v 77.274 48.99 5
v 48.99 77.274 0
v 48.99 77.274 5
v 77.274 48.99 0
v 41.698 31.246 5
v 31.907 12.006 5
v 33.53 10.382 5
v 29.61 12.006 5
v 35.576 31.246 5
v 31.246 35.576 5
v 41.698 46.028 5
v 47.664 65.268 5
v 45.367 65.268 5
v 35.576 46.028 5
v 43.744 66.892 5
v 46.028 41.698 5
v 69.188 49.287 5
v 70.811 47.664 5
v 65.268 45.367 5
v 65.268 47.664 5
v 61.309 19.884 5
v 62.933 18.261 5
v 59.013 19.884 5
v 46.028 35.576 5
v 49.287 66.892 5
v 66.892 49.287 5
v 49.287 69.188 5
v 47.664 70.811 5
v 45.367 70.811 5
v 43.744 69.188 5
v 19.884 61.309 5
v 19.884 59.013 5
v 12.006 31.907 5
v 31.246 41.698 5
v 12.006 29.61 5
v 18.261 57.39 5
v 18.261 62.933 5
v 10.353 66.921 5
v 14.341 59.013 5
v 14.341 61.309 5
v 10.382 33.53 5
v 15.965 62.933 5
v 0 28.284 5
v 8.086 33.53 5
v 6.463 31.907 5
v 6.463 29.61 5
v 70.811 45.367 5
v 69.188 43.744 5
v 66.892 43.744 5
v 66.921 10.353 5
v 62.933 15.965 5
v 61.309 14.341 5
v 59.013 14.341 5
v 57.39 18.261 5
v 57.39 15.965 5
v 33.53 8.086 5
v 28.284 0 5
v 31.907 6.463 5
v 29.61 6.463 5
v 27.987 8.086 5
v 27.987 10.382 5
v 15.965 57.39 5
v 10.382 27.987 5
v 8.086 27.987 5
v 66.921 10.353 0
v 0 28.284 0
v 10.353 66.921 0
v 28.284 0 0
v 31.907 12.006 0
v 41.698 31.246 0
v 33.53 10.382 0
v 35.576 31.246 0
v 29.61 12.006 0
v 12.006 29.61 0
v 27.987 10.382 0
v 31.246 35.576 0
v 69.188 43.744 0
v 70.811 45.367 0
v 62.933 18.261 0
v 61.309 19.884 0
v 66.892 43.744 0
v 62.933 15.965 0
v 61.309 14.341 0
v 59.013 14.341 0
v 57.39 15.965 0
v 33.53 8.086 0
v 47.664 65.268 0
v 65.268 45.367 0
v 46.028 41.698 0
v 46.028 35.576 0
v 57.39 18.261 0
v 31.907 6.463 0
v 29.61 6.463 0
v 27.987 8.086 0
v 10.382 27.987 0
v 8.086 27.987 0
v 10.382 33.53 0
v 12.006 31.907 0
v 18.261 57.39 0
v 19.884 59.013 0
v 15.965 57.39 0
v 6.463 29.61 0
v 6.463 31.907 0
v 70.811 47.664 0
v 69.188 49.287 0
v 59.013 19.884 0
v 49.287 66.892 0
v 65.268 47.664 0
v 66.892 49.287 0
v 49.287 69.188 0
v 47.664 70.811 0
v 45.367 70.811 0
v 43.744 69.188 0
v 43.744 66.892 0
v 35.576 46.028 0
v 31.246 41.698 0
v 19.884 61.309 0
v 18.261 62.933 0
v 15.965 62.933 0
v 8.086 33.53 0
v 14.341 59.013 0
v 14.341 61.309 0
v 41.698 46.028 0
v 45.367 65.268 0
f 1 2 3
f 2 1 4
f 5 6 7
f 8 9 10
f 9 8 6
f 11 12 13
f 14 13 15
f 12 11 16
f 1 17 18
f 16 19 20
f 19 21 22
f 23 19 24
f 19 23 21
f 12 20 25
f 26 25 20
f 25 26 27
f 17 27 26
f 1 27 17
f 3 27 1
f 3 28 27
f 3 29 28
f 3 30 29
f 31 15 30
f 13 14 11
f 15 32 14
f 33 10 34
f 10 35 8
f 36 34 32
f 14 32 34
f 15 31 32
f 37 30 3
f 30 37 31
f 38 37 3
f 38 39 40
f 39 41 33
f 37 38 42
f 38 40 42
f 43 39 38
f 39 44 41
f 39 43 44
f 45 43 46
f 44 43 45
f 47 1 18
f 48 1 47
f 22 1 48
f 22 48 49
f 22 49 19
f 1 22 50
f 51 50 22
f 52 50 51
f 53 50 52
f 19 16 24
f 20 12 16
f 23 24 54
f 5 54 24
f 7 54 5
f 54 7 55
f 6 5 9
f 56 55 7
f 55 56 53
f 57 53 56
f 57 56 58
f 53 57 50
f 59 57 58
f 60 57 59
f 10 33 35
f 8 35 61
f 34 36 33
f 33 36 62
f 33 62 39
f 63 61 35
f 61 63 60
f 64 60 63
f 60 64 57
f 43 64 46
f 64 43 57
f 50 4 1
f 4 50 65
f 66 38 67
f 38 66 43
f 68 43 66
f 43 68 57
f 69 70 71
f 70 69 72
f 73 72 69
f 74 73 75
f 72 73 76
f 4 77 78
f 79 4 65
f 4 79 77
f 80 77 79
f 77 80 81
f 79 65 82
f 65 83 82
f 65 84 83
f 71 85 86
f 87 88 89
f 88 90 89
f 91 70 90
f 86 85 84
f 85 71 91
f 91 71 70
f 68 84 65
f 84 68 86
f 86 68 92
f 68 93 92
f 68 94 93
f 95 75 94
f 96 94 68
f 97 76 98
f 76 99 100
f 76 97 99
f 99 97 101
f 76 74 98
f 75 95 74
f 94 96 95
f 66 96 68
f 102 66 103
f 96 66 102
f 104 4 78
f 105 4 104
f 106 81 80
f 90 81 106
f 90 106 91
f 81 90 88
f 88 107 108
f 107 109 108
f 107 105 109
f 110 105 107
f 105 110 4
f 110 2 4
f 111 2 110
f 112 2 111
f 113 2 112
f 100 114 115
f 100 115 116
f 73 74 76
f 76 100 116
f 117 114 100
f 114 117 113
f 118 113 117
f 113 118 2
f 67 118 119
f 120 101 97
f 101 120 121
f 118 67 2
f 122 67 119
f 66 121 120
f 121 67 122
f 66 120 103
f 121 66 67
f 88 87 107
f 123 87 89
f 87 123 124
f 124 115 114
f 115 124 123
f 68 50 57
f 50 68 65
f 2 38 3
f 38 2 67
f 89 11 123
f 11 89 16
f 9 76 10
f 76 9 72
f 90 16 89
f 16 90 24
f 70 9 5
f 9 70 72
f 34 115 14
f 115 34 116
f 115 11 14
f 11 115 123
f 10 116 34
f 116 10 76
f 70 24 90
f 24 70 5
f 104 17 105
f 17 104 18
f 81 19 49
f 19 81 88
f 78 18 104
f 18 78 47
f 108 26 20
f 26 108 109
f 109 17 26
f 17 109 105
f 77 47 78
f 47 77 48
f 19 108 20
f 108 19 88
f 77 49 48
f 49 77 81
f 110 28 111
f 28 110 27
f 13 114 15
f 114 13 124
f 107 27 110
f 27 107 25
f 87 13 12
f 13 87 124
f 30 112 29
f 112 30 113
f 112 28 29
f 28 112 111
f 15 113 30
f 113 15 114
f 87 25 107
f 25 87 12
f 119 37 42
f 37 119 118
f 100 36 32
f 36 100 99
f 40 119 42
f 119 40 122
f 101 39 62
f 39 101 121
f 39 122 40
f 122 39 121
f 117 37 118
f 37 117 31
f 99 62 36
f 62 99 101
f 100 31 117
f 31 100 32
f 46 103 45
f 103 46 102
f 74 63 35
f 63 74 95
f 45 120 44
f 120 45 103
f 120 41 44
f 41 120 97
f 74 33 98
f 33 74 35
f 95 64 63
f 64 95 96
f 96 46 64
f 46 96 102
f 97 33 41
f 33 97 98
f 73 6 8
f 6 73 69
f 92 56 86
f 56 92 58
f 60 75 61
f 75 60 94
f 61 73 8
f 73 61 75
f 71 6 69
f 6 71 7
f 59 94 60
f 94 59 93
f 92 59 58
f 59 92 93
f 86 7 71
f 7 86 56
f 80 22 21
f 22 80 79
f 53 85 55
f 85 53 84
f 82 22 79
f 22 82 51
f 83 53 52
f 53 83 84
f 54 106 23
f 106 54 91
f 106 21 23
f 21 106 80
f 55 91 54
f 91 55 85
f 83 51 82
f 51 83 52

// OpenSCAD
$fn = 32;

// ----------------------------------------------------------------------
// Polygon plate: 6-gon R40, 6 bolt windows
// ----------------------------------------------------------------------

// --- parameters (mm) ---
sides = 6;                // number of polygon sides
plate_r = 40;             // circumscribed radius of the polygon
bore_r = 8;               // centre bore radius
bolts = 6;                // number of bolt windows
ring_r = 30.44;           // bolt-circle radius
bolt_r = 3;               // bolt window radius
plate_t = 5;              // plate thickness, Z (extrusion height)

plate_d = 2 * plate_r;  // circumscribed diameter
bore_d = 2 * bore_r;  // centre bore diameter
bolt_d = 2 * bolt_r;  // bolt window diameter
ring_d = 2 * ring_r;  // bolt-circle diameter

profile = [[77.274, 48.99], [48.99, 77.274], [10.353, 66.921], [0, 28.284], [28.284, 0], [66.921, 10.353]];  // primary outline, 6 points, counter clockwise
void_1 = [[46.028, 41.698], [41.698, 46.028], [35.576, 46.028], [31.246, 41.698], [31.246, 35.576], [35.576, 31.246], [41.698, 31.246], [46.028, 35.576]];  // centre bore, 8 points
void_2 = [[70.811, 47.664], [69.188, 49.287], [66.892, 49.287], [65.268, 47.664], [65.268, 45.367], [66.892, 43.744], [69.188, 43.744], [70.811, 45.367]];  // bolt window 1, 8 points
void_3 = [[49.287, 69.188], [47.664, 70.811], [45.367, 70.811], [43.744, 69.188], [43.744, 66.892], [45.367, 65.268], [47.664, 65.268], [49.287, 66.892]];  // bolt window 2, 8 points
void_4 = [[19.884, 61.309], [18.261, 62.933], [15.965, 62.933], [14.341, 61.309], [14.341, 59.013], [15.965, 57.39], [18.261, 57.39], [19.884, 59.013]];  // bolt window 3, 8 points
void_5 = [[12.006, 31.907], [10.382, 33.53], [8.086, 33.53], [6.463, 31.907], [6.463, 29.61], [8.086, 27.987], [10.382, 27.987], [12.006, 29.61]];  // bolt window 4, 8 points
void_6 = [[33.53, 10.382], [31.907, 12.006], [29.61, 12.006], [27.987, 10.382], [27.987, 8.086], [29.61, 6.463], [31.907, 6.463], [33.53, 8.086]];  // bolt window 5, 8 points
void_7 = [[62.933, 18.261], [61.309, 19.884], [59.013, 19.884], [57.39, 18.261], [57.39, 15.965], [59.013, 14.341], [61.309, 14.341], [62.933, 15.965]];  // bolt window 6, 8 points

// --- the one profile operation ---
difference() {
  linear_extrude(height = plate_t) polygon(points = profile);
  translate([0, 0, -1])
    linear_extrude(height = plate_t + 2) polygon(points = void_1);
  translate([0, 0, -1])
    linear_extrude(height = plate_t + 2) polygon(points = void_2);
  translate([0, 0, -1])
    linear_extrude(height = plate_t + 2) polygon(points = void_3);
  translate([0, 0, -1])
    linear_extrude(height = plate_t + 2) polygon(points = void_4);
  translate([0, 0, -1])
    linear_extrude(height = plate_t + 2) polygon(points = void_5);
  translate([0, 0, -1])
    linear_extrude(height = plate_t + 2) polygon(points = void_6);
  translate([0, 0, -1])
    linear_extrude(height = plate_t + 2) polygon(points = void_7);
}
